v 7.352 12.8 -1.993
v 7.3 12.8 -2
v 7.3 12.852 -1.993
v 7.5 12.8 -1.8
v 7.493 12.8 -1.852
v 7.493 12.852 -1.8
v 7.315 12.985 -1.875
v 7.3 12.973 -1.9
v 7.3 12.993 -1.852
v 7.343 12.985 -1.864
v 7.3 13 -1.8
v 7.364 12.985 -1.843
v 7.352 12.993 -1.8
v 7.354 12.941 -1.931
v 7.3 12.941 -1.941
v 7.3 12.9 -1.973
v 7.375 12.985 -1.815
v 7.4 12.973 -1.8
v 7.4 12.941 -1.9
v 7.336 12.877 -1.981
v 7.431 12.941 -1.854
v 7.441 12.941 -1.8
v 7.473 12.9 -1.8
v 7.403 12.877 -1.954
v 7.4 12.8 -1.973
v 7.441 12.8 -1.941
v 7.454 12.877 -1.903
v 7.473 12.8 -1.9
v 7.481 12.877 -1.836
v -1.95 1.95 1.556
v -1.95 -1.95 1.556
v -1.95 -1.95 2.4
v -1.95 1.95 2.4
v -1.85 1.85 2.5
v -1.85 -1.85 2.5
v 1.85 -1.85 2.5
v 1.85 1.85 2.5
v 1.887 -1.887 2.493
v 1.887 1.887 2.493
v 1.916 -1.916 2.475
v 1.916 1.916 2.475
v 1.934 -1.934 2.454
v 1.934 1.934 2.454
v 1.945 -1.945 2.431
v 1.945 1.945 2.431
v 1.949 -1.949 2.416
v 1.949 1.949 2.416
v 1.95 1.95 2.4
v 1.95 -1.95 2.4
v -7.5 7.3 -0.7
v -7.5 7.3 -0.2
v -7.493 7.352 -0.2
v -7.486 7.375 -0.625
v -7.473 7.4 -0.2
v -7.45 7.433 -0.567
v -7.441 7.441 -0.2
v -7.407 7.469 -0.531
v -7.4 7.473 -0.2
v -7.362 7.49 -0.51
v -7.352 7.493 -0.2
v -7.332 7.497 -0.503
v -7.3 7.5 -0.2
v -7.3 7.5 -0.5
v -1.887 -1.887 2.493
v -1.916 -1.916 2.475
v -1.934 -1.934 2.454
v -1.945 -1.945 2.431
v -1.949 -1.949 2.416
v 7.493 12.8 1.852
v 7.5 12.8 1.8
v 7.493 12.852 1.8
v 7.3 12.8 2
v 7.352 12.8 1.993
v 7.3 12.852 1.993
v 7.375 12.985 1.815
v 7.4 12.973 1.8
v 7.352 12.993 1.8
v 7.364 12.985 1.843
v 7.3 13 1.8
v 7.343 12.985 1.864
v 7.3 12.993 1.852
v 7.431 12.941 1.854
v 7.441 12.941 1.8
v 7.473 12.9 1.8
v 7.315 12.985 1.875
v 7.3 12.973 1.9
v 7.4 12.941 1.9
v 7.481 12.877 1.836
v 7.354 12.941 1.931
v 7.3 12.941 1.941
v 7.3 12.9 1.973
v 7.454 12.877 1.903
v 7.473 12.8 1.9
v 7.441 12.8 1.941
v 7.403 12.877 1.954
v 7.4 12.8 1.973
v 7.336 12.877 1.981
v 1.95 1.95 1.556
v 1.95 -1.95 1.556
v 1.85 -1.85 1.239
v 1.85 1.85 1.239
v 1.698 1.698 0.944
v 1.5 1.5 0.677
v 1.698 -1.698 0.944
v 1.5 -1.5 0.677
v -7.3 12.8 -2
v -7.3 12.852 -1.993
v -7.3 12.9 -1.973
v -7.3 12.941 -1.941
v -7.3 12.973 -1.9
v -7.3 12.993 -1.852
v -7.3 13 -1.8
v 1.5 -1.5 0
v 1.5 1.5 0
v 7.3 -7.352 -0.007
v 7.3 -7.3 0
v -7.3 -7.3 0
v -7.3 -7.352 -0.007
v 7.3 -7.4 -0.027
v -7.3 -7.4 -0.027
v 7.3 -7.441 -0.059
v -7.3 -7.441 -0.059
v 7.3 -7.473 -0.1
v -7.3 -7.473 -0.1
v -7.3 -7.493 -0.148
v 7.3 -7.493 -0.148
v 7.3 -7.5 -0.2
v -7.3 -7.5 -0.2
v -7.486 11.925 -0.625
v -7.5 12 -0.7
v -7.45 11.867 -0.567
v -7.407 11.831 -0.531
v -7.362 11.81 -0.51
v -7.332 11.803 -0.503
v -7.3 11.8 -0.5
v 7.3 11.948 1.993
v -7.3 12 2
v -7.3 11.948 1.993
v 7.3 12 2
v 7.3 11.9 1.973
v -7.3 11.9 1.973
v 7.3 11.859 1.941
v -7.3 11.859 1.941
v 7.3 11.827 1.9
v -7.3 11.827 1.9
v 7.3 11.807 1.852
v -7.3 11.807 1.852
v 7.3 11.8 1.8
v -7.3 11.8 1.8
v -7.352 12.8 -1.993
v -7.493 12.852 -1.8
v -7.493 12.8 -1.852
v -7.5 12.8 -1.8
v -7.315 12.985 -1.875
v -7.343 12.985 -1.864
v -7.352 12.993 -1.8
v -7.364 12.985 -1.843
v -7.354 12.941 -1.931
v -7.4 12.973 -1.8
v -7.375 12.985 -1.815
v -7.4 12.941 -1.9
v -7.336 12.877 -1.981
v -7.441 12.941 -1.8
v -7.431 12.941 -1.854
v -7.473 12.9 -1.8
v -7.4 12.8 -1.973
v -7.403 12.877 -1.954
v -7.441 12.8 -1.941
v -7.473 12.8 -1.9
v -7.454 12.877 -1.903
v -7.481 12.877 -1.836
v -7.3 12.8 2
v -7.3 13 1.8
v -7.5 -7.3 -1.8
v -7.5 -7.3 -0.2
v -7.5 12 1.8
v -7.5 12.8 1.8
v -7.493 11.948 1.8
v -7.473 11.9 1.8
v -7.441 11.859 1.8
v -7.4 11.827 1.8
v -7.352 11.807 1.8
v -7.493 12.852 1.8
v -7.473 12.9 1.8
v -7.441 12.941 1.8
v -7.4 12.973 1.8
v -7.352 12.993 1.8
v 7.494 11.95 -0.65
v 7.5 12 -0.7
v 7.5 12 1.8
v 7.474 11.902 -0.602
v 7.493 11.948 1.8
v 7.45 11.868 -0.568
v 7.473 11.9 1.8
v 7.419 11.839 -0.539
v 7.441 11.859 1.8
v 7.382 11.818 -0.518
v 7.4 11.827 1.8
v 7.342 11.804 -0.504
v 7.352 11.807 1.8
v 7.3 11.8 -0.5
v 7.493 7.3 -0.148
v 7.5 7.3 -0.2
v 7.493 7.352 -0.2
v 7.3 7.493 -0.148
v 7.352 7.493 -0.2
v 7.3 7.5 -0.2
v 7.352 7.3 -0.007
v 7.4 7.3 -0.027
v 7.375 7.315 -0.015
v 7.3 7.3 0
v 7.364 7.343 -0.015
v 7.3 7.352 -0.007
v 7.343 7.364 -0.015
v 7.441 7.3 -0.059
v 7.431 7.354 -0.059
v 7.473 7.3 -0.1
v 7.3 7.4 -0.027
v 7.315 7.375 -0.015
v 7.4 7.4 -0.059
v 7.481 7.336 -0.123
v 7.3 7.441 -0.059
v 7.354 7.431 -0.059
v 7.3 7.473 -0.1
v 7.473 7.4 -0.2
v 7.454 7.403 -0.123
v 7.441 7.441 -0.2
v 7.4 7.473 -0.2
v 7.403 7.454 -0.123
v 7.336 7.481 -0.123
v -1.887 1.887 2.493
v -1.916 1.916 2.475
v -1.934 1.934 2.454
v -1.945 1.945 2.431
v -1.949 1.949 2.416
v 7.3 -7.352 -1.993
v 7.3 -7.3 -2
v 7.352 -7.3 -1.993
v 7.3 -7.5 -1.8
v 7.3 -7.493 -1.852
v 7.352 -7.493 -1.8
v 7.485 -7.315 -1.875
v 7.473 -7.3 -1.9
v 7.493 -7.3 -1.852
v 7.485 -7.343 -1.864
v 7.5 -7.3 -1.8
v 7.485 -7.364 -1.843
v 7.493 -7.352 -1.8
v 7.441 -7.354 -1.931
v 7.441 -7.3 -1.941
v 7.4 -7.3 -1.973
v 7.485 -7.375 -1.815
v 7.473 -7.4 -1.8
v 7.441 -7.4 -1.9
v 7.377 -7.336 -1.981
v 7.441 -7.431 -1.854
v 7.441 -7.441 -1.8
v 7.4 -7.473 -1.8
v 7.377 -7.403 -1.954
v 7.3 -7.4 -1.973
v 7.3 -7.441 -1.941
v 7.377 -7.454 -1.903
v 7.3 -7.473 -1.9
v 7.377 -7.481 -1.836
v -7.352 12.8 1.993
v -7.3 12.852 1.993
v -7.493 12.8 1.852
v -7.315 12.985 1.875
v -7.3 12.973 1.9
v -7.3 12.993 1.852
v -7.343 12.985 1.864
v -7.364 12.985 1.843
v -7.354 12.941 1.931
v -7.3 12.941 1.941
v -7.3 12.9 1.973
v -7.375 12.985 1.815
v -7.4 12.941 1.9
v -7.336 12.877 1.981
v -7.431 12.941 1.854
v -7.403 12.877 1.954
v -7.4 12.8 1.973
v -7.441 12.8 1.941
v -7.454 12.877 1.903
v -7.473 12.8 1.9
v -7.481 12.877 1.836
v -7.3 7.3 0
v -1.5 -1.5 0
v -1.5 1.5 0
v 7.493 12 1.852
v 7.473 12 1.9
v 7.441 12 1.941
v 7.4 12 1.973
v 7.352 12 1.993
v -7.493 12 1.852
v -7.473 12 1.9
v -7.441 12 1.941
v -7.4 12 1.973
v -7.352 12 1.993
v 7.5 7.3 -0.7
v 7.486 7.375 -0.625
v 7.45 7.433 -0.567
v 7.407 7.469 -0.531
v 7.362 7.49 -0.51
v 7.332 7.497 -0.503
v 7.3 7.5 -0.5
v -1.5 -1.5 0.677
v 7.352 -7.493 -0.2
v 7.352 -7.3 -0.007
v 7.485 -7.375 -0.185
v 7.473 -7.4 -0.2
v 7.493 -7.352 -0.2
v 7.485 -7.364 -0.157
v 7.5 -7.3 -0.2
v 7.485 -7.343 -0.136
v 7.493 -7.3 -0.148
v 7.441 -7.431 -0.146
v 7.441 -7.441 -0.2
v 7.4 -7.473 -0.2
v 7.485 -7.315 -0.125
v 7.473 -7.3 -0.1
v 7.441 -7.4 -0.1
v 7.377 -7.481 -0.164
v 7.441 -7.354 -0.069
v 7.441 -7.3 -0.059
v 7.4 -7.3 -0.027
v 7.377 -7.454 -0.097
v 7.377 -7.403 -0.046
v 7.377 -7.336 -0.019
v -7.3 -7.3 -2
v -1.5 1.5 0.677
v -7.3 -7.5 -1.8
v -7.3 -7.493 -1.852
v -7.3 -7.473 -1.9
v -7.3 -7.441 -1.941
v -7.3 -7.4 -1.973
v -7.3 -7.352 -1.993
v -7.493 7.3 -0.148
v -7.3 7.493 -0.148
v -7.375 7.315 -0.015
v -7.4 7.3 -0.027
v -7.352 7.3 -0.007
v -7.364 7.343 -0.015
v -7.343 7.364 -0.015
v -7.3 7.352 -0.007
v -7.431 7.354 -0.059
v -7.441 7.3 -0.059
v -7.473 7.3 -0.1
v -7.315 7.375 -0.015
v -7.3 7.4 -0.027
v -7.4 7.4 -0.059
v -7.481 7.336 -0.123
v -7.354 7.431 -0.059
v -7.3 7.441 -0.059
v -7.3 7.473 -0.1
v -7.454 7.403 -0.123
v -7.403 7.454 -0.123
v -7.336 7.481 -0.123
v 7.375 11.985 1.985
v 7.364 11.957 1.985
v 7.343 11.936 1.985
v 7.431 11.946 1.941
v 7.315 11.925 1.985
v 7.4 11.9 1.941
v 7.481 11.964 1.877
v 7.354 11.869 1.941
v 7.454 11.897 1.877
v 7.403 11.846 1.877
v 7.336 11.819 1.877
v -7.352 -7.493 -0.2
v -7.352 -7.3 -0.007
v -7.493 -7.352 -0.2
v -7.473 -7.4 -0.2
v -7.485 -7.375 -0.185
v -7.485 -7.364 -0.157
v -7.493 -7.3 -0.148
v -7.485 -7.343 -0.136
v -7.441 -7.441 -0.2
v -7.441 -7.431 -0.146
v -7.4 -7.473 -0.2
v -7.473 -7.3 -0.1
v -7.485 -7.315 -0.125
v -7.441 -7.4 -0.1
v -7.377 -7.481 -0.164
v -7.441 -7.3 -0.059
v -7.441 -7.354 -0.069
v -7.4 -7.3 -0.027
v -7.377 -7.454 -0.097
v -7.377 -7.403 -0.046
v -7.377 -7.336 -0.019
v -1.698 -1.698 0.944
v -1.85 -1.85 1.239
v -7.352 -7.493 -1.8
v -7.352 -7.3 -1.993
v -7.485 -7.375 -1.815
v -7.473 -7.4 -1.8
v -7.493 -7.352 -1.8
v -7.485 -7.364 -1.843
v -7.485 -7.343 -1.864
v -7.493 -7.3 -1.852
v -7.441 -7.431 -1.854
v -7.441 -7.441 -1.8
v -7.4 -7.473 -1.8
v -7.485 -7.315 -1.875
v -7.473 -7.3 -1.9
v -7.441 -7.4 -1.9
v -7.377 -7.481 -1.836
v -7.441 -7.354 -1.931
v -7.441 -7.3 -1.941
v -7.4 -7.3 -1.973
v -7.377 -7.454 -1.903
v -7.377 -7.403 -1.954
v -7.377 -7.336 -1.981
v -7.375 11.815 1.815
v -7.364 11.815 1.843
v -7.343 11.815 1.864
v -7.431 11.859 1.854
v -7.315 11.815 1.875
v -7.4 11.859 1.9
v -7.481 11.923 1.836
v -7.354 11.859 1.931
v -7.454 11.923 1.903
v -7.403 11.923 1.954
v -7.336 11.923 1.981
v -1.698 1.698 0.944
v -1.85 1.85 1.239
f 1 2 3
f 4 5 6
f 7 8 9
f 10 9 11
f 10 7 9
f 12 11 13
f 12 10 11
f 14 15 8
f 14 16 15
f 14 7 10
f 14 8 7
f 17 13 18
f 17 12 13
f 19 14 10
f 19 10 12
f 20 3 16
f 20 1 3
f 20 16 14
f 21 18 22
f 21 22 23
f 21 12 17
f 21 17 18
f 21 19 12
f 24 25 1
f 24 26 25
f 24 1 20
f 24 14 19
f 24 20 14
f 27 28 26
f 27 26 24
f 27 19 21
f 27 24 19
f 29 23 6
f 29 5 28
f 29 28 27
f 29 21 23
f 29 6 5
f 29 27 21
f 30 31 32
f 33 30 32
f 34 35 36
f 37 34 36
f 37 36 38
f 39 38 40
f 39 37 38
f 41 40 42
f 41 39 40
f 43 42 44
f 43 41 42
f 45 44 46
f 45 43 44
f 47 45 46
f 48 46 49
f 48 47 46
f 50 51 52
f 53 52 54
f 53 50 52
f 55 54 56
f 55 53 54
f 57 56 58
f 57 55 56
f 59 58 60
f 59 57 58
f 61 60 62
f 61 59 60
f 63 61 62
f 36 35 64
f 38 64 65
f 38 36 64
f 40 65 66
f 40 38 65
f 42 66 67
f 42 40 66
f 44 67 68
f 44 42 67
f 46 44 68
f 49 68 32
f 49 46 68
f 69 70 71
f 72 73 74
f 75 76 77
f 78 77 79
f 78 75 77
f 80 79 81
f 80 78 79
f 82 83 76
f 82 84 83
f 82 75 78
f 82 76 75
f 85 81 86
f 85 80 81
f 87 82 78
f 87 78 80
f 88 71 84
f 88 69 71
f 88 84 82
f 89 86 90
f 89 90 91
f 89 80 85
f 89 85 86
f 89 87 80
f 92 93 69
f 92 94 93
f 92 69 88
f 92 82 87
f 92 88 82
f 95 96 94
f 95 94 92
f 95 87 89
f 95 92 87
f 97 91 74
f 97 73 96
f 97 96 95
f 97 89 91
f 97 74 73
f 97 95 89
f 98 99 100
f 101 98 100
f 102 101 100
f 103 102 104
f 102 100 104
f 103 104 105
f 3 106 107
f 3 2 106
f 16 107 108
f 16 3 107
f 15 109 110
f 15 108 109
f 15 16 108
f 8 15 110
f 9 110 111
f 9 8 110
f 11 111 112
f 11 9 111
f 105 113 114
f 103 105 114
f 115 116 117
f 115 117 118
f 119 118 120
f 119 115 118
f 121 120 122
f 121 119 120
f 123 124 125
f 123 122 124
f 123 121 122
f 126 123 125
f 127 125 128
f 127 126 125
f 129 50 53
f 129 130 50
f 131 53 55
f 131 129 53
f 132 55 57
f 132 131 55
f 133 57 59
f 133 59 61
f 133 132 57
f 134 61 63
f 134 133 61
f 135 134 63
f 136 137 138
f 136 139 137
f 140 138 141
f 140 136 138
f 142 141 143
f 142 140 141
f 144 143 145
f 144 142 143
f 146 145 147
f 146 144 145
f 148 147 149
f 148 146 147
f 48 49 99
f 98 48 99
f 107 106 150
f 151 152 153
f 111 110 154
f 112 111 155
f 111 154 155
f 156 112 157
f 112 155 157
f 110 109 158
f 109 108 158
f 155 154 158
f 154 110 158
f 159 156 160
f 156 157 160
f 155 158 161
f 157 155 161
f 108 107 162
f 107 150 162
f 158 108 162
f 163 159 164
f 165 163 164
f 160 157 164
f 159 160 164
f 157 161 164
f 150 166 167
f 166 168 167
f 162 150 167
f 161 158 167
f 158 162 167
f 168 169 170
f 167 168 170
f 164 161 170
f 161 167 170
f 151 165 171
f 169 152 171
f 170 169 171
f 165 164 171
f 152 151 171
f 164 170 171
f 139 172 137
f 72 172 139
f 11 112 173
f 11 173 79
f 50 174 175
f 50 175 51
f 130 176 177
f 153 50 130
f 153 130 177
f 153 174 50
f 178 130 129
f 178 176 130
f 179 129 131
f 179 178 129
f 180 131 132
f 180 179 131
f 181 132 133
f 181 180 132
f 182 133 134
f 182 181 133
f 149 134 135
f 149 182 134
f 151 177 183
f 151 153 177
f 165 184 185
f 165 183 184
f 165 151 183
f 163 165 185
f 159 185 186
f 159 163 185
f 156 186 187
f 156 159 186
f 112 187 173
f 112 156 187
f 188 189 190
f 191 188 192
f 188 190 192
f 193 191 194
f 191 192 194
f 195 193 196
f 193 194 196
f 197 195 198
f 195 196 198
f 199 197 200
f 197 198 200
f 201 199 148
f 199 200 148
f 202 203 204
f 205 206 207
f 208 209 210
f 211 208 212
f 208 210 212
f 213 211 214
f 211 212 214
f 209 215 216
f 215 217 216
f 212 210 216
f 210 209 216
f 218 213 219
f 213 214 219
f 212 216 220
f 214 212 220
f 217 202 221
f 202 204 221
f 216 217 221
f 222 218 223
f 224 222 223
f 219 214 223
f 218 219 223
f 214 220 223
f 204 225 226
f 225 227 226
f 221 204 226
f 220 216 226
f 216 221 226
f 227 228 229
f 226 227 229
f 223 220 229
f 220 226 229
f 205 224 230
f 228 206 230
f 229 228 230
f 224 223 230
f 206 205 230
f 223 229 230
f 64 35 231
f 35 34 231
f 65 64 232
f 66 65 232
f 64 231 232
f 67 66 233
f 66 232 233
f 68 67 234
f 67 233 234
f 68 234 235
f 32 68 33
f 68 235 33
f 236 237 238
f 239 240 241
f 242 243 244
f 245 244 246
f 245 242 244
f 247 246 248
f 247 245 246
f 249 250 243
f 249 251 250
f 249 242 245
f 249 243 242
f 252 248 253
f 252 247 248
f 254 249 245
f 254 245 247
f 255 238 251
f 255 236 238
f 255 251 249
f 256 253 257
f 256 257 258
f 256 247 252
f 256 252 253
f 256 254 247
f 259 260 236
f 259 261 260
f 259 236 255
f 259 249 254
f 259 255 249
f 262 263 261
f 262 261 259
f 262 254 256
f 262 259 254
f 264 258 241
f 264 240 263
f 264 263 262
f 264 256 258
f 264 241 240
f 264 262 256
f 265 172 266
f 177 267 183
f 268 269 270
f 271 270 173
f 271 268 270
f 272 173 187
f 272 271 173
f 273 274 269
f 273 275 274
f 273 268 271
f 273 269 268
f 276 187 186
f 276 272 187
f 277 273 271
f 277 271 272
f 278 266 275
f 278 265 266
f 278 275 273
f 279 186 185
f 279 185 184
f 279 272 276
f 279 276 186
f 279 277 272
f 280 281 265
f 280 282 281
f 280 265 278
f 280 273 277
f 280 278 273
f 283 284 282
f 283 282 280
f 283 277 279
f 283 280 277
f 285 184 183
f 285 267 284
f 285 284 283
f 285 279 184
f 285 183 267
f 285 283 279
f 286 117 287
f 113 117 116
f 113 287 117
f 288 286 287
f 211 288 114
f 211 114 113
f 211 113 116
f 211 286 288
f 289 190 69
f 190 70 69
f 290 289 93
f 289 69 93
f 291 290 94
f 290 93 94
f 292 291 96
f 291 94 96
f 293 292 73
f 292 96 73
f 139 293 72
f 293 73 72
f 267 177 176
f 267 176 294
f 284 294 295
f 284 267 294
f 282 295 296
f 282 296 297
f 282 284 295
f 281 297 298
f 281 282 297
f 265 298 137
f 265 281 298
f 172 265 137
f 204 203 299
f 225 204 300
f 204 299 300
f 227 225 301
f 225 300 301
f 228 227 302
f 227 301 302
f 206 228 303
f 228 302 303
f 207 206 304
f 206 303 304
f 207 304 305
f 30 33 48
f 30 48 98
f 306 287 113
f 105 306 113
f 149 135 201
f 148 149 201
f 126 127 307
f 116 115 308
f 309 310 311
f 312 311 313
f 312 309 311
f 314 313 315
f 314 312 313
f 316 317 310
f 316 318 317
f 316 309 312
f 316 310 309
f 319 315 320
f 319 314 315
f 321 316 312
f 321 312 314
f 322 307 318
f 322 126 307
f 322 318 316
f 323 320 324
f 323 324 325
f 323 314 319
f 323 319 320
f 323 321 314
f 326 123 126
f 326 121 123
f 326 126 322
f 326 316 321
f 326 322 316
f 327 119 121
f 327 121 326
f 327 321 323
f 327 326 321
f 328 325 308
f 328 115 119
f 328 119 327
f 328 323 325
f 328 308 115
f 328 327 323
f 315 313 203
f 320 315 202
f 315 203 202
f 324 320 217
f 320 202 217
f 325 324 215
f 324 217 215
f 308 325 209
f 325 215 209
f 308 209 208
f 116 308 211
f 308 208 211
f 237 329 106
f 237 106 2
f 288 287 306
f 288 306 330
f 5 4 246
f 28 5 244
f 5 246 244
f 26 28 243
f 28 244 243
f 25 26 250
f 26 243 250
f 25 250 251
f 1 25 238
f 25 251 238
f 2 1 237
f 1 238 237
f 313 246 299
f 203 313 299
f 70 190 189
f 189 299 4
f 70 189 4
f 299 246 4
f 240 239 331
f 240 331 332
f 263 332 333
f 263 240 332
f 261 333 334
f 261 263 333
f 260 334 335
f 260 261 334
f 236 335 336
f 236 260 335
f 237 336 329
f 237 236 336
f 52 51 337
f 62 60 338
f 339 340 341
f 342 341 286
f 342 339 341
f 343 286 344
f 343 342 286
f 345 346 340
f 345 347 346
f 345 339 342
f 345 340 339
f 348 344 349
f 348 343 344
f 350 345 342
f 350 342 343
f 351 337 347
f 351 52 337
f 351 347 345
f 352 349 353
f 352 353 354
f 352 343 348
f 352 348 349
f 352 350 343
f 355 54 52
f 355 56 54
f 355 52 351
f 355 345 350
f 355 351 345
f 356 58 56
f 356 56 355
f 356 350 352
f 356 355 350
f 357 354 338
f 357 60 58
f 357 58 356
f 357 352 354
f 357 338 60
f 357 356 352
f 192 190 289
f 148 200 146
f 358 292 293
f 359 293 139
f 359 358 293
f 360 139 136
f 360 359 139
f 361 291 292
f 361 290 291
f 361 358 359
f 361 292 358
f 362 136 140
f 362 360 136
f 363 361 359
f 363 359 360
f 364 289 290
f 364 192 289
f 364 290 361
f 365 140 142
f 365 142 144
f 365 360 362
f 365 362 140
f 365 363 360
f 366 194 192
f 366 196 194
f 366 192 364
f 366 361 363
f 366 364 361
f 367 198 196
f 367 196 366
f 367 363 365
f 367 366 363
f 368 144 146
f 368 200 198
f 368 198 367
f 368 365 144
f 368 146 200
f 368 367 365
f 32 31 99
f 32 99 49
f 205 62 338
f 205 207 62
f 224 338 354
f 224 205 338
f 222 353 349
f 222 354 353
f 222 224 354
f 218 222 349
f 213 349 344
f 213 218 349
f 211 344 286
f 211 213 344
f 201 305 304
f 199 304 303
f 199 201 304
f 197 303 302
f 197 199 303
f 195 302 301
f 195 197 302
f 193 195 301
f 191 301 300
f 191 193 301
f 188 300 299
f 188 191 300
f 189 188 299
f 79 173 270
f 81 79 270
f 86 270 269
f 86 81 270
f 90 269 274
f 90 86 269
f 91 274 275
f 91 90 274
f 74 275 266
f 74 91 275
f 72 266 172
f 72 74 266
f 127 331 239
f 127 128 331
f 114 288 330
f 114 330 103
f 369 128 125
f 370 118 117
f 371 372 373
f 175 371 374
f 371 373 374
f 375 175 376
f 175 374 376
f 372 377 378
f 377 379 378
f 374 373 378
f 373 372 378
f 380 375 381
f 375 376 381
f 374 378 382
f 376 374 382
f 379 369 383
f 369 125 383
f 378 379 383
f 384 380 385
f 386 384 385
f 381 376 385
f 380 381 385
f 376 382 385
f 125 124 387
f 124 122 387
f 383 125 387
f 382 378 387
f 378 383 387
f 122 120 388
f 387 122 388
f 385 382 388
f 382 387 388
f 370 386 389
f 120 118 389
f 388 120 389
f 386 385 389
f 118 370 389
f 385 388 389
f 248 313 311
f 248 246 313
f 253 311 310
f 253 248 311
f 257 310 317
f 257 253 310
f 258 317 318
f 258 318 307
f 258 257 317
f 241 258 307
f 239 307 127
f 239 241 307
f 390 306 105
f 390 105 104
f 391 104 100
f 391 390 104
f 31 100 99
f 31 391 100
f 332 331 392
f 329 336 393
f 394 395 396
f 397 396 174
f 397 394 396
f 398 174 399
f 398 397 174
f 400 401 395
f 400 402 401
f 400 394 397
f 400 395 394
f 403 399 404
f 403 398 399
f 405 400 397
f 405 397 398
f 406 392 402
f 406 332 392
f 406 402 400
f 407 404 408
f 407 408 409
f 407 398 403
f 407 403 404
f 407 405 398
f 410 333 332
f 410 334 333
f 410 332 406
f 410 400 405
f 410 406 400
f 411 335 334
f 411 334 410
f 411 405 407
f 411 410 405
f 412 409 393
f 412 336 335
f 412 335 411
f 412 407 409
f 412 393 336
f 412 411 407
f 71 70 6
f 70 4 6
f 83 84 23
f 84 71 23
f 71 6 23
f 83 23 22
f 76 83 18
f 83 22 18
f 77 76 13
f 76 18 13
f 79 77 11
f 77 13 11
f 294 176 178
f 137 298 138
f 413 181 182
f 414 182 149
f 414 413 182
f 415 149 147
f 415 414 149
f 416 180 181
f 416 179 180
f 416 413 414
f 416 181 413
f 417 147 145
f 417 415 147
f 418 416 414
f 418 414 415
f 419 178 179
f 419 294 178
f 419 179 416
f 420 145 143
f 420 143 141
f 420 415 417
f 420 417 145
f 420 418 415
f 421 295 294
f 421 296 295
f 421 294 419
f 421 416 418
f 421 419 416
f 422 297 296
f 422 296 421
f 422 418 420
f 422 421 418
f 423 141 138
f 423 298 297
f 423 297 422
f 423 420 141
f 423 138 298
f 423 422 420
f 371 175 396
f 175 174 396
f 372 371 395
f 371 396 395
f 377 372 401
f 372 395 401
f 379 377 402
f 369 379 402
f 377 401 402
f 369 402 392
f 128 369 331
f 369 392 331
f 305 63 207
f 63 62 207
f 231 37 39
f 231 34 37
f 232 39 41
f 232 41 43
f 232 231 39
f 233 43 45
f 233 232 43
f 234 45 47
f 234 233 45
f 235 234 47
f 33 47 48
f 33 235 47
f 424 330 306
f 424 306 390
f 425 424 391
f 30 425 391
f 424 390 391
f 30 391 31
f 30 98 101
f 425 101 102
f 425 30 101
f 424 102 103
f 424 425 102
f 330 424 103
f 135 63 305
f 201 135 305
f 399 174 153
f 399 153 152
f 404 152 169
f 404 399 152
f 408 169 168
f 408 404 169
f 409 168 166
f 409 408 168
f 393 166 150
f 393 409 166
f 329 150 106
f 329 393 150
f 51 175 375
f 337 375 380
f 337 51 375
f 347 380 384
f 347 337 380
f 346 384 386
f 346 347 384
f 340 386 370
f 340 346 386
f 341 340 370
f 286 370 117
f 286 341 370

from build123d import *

# Parameters (mm, degrees)
SKETCH_1_W                      = 15
SKETCH_1_H                      = 15
EXTRUDE_1_DEPTH                 = 2
SKETCH_2_W                      = 3
SKETCH_2_H                      = 3
EXTRUDE_2_DEPTH                 = 1
EXTRUDE_3_DEPTH                 = 2
EXTRUDE_3_DEPTH_BACK            = 2
CUT_EXTRUDE_1_REACH             = 12.897
CUT_EXTRUDE_1_DIRECTION_2_REACH = 12.897
FILLET_1_R                      = 0.1
SKETCH_5_W                      = 15
SKETCH_5_H                      = 1.5
EXTRUDE_4_DEPTH                 = 5.5
SKETCH_6_W                      = 15
SKETCH_6_H                      = 1.2
EXTRUDE_5_DEPTH                 = 2.5
FILLET_2_R                      = 0.2


with BuildPart() as part:
    # 草图1 → 凸台-拉伸1 (new body)
    with BuildSketch(Plane.XY):
        Rectangle(SKETCH_1_W, SKETCH_1_H)
    extrude(amount=-EXTRUDE_1_DEPTH)

    # 草图2 → 凸台-拉伸2 (add)
    with BuildSketch(Plane.XY):
        Rectangle(SKETCH_2_W, SKETCH_2_H)
    extrude(amount=EXTRUDE_2_DEPTH)

    # 草图3 → 凸台-拉伸3 (add, two sides: drawn at the far end of the back side and taken through both)
    with BuildSketch(Plane(origin=(0, 0, 0), x_dir=(1, 0, 0), z_dir=(0, 1, 0)).offset(-EXTRUDE_3_DEPTH_BACK)):
        with BuildLine():
            Line((-1.95, -2.5), (1.95, -2.5))
            Line((1.95, -2.5), (1.95, -1.555590279))
            ThreePointArc((1.95, -1.555590279), (1.780042303, -1.088161527), (1.5, -0.677124344))
            Line((1.5, -0.677124344), (-1.5, -0.677124344))
            ThreePointArc((-1.5, -0.677124344), (-1.780042303, -1.088161527), (-1.95, -1.555590279))
            Line((-1.95, -1.555590279), (-1.95, -2.5))
        make_face()
    extrude(amount=EXTRUDE_3_DEPTH + EXTRUDE_3_DEPTH_BACK)

    # 草图4 → 切除-拉伸1 (cut, up to next)
    with BuildSketch(Plane(origin=(0, 0, 0), x_dir=(0, 0, -1), z_dir=(1, 0, 0)), mode=Mode.PRIVATE) as cut_extrude_1_sk1:
        with BuildLine():
            Line((-2.5, 1.95), (-1.555590279, 1.95))
            ThreePointArc((-1.555590279, 1.95), (-1.088161527, 1.780042303), (-0.677124344, 1.5))
            Line((-0.677124344, 1.5), (-0.677124344, 2))
            Line((-0.677124344, 2), (-2.5, 2))
            Line((-2.5, 2), (-2.5, 1.95))
        make_face()
    cut_extrude_1_tool1 = extrude(cut_extrude_1_sk1.sketch, amount=-CUT_EXTRUDE_1_REACH, mode=Mode.PRIVATE) & part.part
    # 草图4 → 切除-拉伸1 (cut, up to next)
    with BuildSketch(Plane(origin=(0, 0, 0), x_dir=(0, 0, -1), z_dir=(1, 0, 0)), mode=Mode.PRIVATE) as cut_extrude_1_sk2:
        with BuildLine():
            Line((-2.5, -2), (-0.677124344, -2))
            Line((-0.677124344, -2), (-0.677124344, -1.5))
            ThreePointArc((-0.677124344, -1.5), (-1.088161527, -1.780042303), (-1.555590279, -1.95))
            Line((-1.555590279, -1.95), (-2.5, -1.95))
            Line((-2.5, -1.95), (-2.5, -2))
        make_face()
    cut_extrude_1_tool2 = extrude(cut_extrude_1_sk2.sketch, amount=-CUT_EXTRUDE_1_REACH, mode=Mode.PRIVATE) & part.part
    add(cut_extrude_1_tool1.solids().sort_by_distance((0, 1.873038, 1.175075))[0], mode=Mode.SUBTRACT)
    add(cut_extrude_1_tool2.solids().sort_by_distance((0, -1.873038, 1.175075))[0], mode=Mode.SUBTRACT)

    # 草图4 → 切除-拉伸1 direction 2 (cut, up to next)
    with BuildSketch(Plane(origin=(0, 0, 0), x_dir=(0, 0, -1), z_dir=(1, 0, 0)), mode=Mode.PRIVATE) as cut_extrude_1_direction_2_sk1:
        with BuildLine():
            Line((-2.5, 1.95), (-1.555590279, 1.95))
            ThreePointArc((-1.555590279, 1.95), (-1.088161527, 1.780042303), (-0.677124344, 1.5))
            Line((-0.677124344, 1.5), (-0.677124344, 2))
            Line((-0.677124344, 2), (-2.5, 2))
            Line((-2.5, 2), (-2.5, 1.95))
        make_face()
    cut_extrude_1_direction_2_tool1 = extrude(cut_extrude_1_direction_2_sk1.sketch, amount=CUT_EXTRUDE_1_DIRECTION_2_REACH, mode=Mode.PRIVATE) & part.part
    # 草图4 → 切除-拉伸1 direction 2 (cut, up to next)
    with BuildSketch(Plane(origin=(0, 0, 0), x_dir=(0, 0, -1), z_dir=(1, 0, 0)), mode=Mode.PRIVATE) as cut_extrude_1_direction_2_sk2:
        with BuildLine():
            Line((-2.5, -2), (-0.677124344, -2))
            Line((-0.677124344, -2), (-0.677124344, -1.5))
            ThreePointArc((-0.677124344, -1.5), (-1.088161527, -1.780042303), (-1.555590279, -1.95))
            Line((-1.555590279, -1.95), (-2.5, -1.95))
            Line((-2.5, -1.95), (-2.5, -2))
        make_face()
    cut_extrude_1_direction_2_tool2 = extrude(cut_extrude_1_direction_2_sk2.sketch, amount=CUT_EXTRUDE_1_DIRECTION_2_REACH, mode=Mode.PRIVATE) & part.part
    add(cut_extrude_1_direction_2_tool1.solids().sort_by_distance((0, 1.873038, 1.175075))[0], mode=Mode.SUBTRACT)
    add(cut_extrude_1_direction_2_tool2.solids().sort_by_distance((0, -1.873038, 1.175075))[0], mode=Mode.SUBTRACT)

    # 圆角1
    fillet_1_edges = [part.edges().sort_by_distance(p)[0] for p in [
        (-1.95, 0, 2.5),
        (1.95, 0, 2.5),
        (0, -1.95, 2.5),
        (0, 1.95, 2.5),
    ]]
    fillet(fillet_1_edges, radius=FILLET_1_R)

    # 草图5 → 凸台-拉伸4 (add)
    with BuildSketch(Plane(origin=(0, 7.5, 0), x_dir=(1, 0, 0), z_dir=(0, 1, 0))):
        with Locations((0, 1.25)):
            Rectangle(SKETCH_5_W, SKETCH_5_H)
    extrude(amount=EXTRUDE_4_DEPTH)

    # 草图6 → 凸台-拉伸5 (add)
    with BuildSketch(Plane.XY.offset(-0.5)):
        with Locations((0, 12.4)):
            Rectangle(SKETCH_6_W, SKETCH_6_H)
    extrude(amount=EXTRUDE_5_DEPTH)

    # 圆角2
    fillet_2_edges = [part.edges().sort_by_distance(p)[0] for p in [
        (0, -7.5, -2),
        (0, -7.5, 0),
        (-7.5, -7.5, -1),
        (-7.5, 2.75, -2),
        (-7.5, 12.4, 2),
        (-7.5, 11.8, 0.75),
        (-7.5, 9.65, -0.5),
        (-7.5, 7.5, -0.25),
        (-7.5, 0, 0),
        (7.5, 7.5, -0.25),
        (7.5, 9.65, -0.5),
        (7.5, 11.8, 0.75),
        (7.5, 12.4, 2),
        (7.5, 2.75, -2),
        (7.5, -7.5, -1),
        (7.5, 0, 0),
        (0, 13, -2),
        (7.5, 13, 0),
        (0, 13, 2),
        (-7.5, 13, 0),
        (0, 7.5, 0),
        (0, 11.8, 2),
    ]]
    fillet(fillet_2_edges, radius=FILLET_2_R)


solid = part.part
